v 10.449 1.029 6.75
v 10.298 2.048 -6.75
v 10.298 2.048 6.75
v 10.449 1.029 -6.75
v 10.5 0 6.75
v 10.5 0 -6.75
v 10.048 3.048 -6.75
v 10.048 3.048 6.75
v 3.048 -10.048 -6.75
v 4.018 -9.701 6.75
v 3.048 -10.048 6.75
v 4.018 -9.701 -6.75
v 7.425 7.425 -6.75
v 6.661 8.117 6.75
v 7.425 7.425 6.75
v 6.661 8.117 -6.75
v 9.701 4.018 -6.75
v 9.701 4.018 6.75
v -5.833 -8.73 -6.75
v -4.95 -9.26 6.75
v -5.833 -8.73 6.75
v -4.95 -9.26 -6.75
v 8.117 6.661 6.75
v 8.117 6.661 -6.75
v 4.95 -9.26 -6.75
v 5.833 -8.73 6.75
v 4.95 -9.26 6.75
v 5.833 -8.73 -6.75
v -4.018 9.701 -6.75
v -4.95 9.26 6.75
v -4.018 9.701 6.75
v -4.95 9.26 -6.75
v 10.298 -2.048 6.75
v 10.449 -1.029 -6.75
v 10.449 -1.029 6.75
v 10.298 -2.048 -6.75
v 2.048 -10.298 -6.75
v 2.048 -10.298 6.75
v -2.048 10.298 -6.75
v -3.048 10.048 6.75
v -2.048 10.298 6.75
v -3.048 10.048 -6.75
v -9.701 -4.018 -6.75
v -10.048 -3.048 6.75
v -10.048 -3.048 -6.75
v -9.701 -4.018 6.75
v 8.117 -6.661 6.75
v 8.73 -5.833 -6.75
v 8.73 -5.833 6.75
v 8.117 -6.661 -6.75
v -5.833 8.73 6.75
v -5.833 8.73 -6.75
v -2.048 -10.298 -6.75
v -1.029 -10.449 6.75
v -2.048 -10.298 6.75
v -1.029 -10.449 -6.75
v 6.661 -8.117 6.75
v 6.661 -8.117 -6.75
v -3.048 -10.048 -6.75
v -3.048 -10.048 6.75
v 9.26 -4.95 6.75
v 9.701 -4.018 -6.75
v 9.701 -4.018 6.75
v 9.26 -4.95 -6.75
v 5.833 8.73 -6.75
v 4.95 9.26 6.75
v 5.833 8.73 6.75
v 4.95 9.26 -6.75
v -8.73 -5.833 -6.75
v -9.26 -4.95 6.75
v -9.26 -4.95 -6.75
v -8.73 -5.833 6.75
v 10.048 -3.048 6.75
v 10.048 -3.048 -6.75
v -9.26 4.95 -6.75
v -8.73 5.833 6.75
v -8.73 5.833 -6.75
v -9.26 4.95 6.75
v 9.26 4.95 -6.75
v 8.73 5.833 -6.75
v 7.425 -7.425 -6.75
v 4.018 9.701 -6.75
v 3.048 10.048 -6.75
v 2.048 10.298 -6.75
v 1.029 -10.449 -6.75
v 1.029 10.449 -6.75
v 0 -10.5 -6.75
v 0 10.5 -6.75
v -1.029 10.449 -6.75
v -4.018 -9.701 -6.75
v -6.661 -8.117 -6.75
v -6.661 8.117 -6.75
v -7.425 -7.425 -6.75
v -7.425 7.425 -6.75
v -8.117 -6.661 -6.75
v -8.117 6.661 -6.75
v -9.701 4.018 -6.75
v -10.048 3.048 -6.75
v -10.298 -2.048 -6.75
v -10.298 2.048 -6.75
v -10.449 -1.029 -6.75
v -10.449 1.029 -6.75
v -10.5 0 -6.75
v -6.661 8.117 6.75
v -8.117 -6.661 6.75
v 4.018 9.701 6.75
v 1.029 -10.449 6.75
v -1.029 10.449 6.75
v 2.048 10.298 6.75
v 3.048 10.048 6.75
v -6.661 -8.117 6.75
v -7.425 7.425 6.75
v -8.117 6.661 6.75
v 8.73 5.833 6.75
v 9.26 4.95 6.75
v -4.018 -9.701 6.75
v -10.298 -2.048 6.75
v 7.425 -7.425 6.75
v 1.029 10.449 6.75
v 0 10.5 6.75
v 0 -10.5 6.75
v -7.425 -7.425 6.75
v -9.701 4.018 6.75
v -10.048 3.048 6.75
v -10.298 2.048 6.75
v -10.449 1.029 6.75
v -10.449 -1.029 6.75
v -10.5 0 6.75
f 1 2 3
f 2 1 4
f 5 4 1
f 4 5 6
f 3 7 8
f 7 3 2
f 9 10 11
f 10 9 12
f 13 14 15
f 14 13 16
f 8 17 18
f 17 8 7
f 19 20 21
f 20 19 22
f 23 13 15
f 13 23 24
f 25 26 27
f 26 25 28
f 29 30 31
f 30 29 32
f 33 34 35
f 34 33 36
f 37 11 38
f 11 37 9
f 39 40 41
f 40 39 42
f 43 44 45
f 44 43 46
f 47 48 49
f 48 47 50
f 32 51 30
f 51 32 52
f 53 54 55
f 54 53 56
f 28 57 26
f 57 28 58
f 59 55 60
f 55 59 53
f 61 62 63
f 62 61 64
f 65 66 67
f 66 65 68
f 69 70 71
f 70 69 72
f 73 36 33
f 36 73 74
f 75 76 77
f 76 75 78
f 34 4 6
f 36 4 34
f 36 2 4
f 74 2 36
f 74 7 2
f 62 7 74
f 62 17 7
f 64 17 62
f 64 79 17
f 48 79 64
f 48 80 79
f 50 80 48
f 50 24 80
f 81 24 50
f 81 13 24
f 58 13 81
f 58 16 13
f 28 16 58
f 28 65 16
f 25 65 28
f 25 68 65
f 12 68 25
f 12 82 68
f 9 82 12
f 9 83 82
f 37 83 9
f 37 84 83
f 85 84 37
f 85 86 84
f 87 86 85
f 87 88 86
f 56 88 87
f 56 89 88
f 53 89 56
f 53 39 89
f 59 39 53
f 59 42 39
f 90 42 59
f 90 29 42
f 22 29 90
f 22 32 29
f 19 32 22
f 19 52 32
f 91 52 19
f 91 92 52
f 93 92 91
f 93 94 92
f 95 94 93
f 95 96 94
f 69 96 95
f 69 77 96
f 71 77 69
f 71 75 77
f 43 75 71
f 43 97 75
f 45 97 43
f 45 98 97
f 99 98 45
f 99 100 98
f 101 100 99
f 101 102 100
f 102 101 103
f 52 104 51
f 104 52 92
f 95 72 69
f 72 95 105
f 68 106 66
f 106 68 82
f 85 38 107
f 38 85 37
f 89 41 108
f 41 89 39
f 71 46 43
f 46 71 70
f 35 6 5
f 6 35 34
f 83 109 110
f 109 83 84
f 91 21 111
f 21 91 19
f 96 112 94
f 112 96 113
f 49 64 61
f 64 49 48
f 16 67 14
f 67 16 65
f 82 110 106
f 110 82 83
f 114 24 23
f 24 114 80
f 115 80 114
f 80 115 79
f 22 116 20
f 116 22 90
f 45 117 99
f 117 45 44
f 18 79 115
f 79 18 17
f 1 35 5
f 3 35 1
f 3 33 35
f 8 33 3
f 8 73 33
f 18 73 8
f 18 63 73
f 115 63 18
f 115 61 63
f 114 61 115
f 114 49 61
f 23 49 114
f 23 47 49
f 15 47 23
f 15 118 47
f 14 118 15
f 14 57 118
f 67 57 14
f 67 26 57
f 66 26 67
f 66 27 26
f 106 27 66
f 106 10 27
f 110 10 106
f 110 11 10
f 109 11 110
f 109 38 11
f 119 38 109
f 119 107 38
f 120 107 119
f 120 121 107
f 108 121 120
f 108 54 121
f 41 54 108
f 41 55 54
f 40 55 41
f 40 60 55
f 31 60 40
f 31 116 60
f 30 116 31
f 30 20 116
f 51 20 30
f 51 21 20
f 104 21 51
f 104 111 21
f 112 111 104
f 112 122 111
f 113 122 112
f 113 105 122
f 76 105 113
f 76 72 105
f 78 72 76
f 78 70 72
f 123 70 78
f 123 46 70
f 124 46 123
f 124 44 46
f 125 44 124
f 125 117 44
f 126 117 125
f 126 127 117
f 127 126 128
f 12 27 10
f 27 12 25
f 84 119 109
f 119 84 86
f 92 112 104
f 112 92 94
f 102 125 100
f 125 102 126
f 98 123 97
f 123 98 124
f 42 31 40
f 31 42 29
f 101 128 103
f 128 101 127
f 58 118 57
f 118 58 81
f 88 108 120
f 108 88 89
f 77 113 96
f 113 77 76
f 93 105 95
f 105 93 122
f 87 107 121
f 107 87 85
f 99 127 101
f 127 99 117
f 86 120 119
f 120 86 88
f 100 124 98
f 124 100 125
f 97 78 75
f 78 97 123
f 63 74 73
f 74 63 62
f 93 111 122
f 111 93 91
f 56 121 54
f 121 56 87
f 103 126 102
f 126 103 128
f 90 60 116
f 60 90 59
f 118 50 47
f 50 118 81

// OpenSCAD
$fn=64;

module radial(a=[10.5,3.7,13.5]) {
    union() {
        cylinder(h=a[2], r=a[0], center=true);
        cylinder(h=a[2], r=a[1], center=true);
    }
}

radial([10.5,3.7,13.5]);
